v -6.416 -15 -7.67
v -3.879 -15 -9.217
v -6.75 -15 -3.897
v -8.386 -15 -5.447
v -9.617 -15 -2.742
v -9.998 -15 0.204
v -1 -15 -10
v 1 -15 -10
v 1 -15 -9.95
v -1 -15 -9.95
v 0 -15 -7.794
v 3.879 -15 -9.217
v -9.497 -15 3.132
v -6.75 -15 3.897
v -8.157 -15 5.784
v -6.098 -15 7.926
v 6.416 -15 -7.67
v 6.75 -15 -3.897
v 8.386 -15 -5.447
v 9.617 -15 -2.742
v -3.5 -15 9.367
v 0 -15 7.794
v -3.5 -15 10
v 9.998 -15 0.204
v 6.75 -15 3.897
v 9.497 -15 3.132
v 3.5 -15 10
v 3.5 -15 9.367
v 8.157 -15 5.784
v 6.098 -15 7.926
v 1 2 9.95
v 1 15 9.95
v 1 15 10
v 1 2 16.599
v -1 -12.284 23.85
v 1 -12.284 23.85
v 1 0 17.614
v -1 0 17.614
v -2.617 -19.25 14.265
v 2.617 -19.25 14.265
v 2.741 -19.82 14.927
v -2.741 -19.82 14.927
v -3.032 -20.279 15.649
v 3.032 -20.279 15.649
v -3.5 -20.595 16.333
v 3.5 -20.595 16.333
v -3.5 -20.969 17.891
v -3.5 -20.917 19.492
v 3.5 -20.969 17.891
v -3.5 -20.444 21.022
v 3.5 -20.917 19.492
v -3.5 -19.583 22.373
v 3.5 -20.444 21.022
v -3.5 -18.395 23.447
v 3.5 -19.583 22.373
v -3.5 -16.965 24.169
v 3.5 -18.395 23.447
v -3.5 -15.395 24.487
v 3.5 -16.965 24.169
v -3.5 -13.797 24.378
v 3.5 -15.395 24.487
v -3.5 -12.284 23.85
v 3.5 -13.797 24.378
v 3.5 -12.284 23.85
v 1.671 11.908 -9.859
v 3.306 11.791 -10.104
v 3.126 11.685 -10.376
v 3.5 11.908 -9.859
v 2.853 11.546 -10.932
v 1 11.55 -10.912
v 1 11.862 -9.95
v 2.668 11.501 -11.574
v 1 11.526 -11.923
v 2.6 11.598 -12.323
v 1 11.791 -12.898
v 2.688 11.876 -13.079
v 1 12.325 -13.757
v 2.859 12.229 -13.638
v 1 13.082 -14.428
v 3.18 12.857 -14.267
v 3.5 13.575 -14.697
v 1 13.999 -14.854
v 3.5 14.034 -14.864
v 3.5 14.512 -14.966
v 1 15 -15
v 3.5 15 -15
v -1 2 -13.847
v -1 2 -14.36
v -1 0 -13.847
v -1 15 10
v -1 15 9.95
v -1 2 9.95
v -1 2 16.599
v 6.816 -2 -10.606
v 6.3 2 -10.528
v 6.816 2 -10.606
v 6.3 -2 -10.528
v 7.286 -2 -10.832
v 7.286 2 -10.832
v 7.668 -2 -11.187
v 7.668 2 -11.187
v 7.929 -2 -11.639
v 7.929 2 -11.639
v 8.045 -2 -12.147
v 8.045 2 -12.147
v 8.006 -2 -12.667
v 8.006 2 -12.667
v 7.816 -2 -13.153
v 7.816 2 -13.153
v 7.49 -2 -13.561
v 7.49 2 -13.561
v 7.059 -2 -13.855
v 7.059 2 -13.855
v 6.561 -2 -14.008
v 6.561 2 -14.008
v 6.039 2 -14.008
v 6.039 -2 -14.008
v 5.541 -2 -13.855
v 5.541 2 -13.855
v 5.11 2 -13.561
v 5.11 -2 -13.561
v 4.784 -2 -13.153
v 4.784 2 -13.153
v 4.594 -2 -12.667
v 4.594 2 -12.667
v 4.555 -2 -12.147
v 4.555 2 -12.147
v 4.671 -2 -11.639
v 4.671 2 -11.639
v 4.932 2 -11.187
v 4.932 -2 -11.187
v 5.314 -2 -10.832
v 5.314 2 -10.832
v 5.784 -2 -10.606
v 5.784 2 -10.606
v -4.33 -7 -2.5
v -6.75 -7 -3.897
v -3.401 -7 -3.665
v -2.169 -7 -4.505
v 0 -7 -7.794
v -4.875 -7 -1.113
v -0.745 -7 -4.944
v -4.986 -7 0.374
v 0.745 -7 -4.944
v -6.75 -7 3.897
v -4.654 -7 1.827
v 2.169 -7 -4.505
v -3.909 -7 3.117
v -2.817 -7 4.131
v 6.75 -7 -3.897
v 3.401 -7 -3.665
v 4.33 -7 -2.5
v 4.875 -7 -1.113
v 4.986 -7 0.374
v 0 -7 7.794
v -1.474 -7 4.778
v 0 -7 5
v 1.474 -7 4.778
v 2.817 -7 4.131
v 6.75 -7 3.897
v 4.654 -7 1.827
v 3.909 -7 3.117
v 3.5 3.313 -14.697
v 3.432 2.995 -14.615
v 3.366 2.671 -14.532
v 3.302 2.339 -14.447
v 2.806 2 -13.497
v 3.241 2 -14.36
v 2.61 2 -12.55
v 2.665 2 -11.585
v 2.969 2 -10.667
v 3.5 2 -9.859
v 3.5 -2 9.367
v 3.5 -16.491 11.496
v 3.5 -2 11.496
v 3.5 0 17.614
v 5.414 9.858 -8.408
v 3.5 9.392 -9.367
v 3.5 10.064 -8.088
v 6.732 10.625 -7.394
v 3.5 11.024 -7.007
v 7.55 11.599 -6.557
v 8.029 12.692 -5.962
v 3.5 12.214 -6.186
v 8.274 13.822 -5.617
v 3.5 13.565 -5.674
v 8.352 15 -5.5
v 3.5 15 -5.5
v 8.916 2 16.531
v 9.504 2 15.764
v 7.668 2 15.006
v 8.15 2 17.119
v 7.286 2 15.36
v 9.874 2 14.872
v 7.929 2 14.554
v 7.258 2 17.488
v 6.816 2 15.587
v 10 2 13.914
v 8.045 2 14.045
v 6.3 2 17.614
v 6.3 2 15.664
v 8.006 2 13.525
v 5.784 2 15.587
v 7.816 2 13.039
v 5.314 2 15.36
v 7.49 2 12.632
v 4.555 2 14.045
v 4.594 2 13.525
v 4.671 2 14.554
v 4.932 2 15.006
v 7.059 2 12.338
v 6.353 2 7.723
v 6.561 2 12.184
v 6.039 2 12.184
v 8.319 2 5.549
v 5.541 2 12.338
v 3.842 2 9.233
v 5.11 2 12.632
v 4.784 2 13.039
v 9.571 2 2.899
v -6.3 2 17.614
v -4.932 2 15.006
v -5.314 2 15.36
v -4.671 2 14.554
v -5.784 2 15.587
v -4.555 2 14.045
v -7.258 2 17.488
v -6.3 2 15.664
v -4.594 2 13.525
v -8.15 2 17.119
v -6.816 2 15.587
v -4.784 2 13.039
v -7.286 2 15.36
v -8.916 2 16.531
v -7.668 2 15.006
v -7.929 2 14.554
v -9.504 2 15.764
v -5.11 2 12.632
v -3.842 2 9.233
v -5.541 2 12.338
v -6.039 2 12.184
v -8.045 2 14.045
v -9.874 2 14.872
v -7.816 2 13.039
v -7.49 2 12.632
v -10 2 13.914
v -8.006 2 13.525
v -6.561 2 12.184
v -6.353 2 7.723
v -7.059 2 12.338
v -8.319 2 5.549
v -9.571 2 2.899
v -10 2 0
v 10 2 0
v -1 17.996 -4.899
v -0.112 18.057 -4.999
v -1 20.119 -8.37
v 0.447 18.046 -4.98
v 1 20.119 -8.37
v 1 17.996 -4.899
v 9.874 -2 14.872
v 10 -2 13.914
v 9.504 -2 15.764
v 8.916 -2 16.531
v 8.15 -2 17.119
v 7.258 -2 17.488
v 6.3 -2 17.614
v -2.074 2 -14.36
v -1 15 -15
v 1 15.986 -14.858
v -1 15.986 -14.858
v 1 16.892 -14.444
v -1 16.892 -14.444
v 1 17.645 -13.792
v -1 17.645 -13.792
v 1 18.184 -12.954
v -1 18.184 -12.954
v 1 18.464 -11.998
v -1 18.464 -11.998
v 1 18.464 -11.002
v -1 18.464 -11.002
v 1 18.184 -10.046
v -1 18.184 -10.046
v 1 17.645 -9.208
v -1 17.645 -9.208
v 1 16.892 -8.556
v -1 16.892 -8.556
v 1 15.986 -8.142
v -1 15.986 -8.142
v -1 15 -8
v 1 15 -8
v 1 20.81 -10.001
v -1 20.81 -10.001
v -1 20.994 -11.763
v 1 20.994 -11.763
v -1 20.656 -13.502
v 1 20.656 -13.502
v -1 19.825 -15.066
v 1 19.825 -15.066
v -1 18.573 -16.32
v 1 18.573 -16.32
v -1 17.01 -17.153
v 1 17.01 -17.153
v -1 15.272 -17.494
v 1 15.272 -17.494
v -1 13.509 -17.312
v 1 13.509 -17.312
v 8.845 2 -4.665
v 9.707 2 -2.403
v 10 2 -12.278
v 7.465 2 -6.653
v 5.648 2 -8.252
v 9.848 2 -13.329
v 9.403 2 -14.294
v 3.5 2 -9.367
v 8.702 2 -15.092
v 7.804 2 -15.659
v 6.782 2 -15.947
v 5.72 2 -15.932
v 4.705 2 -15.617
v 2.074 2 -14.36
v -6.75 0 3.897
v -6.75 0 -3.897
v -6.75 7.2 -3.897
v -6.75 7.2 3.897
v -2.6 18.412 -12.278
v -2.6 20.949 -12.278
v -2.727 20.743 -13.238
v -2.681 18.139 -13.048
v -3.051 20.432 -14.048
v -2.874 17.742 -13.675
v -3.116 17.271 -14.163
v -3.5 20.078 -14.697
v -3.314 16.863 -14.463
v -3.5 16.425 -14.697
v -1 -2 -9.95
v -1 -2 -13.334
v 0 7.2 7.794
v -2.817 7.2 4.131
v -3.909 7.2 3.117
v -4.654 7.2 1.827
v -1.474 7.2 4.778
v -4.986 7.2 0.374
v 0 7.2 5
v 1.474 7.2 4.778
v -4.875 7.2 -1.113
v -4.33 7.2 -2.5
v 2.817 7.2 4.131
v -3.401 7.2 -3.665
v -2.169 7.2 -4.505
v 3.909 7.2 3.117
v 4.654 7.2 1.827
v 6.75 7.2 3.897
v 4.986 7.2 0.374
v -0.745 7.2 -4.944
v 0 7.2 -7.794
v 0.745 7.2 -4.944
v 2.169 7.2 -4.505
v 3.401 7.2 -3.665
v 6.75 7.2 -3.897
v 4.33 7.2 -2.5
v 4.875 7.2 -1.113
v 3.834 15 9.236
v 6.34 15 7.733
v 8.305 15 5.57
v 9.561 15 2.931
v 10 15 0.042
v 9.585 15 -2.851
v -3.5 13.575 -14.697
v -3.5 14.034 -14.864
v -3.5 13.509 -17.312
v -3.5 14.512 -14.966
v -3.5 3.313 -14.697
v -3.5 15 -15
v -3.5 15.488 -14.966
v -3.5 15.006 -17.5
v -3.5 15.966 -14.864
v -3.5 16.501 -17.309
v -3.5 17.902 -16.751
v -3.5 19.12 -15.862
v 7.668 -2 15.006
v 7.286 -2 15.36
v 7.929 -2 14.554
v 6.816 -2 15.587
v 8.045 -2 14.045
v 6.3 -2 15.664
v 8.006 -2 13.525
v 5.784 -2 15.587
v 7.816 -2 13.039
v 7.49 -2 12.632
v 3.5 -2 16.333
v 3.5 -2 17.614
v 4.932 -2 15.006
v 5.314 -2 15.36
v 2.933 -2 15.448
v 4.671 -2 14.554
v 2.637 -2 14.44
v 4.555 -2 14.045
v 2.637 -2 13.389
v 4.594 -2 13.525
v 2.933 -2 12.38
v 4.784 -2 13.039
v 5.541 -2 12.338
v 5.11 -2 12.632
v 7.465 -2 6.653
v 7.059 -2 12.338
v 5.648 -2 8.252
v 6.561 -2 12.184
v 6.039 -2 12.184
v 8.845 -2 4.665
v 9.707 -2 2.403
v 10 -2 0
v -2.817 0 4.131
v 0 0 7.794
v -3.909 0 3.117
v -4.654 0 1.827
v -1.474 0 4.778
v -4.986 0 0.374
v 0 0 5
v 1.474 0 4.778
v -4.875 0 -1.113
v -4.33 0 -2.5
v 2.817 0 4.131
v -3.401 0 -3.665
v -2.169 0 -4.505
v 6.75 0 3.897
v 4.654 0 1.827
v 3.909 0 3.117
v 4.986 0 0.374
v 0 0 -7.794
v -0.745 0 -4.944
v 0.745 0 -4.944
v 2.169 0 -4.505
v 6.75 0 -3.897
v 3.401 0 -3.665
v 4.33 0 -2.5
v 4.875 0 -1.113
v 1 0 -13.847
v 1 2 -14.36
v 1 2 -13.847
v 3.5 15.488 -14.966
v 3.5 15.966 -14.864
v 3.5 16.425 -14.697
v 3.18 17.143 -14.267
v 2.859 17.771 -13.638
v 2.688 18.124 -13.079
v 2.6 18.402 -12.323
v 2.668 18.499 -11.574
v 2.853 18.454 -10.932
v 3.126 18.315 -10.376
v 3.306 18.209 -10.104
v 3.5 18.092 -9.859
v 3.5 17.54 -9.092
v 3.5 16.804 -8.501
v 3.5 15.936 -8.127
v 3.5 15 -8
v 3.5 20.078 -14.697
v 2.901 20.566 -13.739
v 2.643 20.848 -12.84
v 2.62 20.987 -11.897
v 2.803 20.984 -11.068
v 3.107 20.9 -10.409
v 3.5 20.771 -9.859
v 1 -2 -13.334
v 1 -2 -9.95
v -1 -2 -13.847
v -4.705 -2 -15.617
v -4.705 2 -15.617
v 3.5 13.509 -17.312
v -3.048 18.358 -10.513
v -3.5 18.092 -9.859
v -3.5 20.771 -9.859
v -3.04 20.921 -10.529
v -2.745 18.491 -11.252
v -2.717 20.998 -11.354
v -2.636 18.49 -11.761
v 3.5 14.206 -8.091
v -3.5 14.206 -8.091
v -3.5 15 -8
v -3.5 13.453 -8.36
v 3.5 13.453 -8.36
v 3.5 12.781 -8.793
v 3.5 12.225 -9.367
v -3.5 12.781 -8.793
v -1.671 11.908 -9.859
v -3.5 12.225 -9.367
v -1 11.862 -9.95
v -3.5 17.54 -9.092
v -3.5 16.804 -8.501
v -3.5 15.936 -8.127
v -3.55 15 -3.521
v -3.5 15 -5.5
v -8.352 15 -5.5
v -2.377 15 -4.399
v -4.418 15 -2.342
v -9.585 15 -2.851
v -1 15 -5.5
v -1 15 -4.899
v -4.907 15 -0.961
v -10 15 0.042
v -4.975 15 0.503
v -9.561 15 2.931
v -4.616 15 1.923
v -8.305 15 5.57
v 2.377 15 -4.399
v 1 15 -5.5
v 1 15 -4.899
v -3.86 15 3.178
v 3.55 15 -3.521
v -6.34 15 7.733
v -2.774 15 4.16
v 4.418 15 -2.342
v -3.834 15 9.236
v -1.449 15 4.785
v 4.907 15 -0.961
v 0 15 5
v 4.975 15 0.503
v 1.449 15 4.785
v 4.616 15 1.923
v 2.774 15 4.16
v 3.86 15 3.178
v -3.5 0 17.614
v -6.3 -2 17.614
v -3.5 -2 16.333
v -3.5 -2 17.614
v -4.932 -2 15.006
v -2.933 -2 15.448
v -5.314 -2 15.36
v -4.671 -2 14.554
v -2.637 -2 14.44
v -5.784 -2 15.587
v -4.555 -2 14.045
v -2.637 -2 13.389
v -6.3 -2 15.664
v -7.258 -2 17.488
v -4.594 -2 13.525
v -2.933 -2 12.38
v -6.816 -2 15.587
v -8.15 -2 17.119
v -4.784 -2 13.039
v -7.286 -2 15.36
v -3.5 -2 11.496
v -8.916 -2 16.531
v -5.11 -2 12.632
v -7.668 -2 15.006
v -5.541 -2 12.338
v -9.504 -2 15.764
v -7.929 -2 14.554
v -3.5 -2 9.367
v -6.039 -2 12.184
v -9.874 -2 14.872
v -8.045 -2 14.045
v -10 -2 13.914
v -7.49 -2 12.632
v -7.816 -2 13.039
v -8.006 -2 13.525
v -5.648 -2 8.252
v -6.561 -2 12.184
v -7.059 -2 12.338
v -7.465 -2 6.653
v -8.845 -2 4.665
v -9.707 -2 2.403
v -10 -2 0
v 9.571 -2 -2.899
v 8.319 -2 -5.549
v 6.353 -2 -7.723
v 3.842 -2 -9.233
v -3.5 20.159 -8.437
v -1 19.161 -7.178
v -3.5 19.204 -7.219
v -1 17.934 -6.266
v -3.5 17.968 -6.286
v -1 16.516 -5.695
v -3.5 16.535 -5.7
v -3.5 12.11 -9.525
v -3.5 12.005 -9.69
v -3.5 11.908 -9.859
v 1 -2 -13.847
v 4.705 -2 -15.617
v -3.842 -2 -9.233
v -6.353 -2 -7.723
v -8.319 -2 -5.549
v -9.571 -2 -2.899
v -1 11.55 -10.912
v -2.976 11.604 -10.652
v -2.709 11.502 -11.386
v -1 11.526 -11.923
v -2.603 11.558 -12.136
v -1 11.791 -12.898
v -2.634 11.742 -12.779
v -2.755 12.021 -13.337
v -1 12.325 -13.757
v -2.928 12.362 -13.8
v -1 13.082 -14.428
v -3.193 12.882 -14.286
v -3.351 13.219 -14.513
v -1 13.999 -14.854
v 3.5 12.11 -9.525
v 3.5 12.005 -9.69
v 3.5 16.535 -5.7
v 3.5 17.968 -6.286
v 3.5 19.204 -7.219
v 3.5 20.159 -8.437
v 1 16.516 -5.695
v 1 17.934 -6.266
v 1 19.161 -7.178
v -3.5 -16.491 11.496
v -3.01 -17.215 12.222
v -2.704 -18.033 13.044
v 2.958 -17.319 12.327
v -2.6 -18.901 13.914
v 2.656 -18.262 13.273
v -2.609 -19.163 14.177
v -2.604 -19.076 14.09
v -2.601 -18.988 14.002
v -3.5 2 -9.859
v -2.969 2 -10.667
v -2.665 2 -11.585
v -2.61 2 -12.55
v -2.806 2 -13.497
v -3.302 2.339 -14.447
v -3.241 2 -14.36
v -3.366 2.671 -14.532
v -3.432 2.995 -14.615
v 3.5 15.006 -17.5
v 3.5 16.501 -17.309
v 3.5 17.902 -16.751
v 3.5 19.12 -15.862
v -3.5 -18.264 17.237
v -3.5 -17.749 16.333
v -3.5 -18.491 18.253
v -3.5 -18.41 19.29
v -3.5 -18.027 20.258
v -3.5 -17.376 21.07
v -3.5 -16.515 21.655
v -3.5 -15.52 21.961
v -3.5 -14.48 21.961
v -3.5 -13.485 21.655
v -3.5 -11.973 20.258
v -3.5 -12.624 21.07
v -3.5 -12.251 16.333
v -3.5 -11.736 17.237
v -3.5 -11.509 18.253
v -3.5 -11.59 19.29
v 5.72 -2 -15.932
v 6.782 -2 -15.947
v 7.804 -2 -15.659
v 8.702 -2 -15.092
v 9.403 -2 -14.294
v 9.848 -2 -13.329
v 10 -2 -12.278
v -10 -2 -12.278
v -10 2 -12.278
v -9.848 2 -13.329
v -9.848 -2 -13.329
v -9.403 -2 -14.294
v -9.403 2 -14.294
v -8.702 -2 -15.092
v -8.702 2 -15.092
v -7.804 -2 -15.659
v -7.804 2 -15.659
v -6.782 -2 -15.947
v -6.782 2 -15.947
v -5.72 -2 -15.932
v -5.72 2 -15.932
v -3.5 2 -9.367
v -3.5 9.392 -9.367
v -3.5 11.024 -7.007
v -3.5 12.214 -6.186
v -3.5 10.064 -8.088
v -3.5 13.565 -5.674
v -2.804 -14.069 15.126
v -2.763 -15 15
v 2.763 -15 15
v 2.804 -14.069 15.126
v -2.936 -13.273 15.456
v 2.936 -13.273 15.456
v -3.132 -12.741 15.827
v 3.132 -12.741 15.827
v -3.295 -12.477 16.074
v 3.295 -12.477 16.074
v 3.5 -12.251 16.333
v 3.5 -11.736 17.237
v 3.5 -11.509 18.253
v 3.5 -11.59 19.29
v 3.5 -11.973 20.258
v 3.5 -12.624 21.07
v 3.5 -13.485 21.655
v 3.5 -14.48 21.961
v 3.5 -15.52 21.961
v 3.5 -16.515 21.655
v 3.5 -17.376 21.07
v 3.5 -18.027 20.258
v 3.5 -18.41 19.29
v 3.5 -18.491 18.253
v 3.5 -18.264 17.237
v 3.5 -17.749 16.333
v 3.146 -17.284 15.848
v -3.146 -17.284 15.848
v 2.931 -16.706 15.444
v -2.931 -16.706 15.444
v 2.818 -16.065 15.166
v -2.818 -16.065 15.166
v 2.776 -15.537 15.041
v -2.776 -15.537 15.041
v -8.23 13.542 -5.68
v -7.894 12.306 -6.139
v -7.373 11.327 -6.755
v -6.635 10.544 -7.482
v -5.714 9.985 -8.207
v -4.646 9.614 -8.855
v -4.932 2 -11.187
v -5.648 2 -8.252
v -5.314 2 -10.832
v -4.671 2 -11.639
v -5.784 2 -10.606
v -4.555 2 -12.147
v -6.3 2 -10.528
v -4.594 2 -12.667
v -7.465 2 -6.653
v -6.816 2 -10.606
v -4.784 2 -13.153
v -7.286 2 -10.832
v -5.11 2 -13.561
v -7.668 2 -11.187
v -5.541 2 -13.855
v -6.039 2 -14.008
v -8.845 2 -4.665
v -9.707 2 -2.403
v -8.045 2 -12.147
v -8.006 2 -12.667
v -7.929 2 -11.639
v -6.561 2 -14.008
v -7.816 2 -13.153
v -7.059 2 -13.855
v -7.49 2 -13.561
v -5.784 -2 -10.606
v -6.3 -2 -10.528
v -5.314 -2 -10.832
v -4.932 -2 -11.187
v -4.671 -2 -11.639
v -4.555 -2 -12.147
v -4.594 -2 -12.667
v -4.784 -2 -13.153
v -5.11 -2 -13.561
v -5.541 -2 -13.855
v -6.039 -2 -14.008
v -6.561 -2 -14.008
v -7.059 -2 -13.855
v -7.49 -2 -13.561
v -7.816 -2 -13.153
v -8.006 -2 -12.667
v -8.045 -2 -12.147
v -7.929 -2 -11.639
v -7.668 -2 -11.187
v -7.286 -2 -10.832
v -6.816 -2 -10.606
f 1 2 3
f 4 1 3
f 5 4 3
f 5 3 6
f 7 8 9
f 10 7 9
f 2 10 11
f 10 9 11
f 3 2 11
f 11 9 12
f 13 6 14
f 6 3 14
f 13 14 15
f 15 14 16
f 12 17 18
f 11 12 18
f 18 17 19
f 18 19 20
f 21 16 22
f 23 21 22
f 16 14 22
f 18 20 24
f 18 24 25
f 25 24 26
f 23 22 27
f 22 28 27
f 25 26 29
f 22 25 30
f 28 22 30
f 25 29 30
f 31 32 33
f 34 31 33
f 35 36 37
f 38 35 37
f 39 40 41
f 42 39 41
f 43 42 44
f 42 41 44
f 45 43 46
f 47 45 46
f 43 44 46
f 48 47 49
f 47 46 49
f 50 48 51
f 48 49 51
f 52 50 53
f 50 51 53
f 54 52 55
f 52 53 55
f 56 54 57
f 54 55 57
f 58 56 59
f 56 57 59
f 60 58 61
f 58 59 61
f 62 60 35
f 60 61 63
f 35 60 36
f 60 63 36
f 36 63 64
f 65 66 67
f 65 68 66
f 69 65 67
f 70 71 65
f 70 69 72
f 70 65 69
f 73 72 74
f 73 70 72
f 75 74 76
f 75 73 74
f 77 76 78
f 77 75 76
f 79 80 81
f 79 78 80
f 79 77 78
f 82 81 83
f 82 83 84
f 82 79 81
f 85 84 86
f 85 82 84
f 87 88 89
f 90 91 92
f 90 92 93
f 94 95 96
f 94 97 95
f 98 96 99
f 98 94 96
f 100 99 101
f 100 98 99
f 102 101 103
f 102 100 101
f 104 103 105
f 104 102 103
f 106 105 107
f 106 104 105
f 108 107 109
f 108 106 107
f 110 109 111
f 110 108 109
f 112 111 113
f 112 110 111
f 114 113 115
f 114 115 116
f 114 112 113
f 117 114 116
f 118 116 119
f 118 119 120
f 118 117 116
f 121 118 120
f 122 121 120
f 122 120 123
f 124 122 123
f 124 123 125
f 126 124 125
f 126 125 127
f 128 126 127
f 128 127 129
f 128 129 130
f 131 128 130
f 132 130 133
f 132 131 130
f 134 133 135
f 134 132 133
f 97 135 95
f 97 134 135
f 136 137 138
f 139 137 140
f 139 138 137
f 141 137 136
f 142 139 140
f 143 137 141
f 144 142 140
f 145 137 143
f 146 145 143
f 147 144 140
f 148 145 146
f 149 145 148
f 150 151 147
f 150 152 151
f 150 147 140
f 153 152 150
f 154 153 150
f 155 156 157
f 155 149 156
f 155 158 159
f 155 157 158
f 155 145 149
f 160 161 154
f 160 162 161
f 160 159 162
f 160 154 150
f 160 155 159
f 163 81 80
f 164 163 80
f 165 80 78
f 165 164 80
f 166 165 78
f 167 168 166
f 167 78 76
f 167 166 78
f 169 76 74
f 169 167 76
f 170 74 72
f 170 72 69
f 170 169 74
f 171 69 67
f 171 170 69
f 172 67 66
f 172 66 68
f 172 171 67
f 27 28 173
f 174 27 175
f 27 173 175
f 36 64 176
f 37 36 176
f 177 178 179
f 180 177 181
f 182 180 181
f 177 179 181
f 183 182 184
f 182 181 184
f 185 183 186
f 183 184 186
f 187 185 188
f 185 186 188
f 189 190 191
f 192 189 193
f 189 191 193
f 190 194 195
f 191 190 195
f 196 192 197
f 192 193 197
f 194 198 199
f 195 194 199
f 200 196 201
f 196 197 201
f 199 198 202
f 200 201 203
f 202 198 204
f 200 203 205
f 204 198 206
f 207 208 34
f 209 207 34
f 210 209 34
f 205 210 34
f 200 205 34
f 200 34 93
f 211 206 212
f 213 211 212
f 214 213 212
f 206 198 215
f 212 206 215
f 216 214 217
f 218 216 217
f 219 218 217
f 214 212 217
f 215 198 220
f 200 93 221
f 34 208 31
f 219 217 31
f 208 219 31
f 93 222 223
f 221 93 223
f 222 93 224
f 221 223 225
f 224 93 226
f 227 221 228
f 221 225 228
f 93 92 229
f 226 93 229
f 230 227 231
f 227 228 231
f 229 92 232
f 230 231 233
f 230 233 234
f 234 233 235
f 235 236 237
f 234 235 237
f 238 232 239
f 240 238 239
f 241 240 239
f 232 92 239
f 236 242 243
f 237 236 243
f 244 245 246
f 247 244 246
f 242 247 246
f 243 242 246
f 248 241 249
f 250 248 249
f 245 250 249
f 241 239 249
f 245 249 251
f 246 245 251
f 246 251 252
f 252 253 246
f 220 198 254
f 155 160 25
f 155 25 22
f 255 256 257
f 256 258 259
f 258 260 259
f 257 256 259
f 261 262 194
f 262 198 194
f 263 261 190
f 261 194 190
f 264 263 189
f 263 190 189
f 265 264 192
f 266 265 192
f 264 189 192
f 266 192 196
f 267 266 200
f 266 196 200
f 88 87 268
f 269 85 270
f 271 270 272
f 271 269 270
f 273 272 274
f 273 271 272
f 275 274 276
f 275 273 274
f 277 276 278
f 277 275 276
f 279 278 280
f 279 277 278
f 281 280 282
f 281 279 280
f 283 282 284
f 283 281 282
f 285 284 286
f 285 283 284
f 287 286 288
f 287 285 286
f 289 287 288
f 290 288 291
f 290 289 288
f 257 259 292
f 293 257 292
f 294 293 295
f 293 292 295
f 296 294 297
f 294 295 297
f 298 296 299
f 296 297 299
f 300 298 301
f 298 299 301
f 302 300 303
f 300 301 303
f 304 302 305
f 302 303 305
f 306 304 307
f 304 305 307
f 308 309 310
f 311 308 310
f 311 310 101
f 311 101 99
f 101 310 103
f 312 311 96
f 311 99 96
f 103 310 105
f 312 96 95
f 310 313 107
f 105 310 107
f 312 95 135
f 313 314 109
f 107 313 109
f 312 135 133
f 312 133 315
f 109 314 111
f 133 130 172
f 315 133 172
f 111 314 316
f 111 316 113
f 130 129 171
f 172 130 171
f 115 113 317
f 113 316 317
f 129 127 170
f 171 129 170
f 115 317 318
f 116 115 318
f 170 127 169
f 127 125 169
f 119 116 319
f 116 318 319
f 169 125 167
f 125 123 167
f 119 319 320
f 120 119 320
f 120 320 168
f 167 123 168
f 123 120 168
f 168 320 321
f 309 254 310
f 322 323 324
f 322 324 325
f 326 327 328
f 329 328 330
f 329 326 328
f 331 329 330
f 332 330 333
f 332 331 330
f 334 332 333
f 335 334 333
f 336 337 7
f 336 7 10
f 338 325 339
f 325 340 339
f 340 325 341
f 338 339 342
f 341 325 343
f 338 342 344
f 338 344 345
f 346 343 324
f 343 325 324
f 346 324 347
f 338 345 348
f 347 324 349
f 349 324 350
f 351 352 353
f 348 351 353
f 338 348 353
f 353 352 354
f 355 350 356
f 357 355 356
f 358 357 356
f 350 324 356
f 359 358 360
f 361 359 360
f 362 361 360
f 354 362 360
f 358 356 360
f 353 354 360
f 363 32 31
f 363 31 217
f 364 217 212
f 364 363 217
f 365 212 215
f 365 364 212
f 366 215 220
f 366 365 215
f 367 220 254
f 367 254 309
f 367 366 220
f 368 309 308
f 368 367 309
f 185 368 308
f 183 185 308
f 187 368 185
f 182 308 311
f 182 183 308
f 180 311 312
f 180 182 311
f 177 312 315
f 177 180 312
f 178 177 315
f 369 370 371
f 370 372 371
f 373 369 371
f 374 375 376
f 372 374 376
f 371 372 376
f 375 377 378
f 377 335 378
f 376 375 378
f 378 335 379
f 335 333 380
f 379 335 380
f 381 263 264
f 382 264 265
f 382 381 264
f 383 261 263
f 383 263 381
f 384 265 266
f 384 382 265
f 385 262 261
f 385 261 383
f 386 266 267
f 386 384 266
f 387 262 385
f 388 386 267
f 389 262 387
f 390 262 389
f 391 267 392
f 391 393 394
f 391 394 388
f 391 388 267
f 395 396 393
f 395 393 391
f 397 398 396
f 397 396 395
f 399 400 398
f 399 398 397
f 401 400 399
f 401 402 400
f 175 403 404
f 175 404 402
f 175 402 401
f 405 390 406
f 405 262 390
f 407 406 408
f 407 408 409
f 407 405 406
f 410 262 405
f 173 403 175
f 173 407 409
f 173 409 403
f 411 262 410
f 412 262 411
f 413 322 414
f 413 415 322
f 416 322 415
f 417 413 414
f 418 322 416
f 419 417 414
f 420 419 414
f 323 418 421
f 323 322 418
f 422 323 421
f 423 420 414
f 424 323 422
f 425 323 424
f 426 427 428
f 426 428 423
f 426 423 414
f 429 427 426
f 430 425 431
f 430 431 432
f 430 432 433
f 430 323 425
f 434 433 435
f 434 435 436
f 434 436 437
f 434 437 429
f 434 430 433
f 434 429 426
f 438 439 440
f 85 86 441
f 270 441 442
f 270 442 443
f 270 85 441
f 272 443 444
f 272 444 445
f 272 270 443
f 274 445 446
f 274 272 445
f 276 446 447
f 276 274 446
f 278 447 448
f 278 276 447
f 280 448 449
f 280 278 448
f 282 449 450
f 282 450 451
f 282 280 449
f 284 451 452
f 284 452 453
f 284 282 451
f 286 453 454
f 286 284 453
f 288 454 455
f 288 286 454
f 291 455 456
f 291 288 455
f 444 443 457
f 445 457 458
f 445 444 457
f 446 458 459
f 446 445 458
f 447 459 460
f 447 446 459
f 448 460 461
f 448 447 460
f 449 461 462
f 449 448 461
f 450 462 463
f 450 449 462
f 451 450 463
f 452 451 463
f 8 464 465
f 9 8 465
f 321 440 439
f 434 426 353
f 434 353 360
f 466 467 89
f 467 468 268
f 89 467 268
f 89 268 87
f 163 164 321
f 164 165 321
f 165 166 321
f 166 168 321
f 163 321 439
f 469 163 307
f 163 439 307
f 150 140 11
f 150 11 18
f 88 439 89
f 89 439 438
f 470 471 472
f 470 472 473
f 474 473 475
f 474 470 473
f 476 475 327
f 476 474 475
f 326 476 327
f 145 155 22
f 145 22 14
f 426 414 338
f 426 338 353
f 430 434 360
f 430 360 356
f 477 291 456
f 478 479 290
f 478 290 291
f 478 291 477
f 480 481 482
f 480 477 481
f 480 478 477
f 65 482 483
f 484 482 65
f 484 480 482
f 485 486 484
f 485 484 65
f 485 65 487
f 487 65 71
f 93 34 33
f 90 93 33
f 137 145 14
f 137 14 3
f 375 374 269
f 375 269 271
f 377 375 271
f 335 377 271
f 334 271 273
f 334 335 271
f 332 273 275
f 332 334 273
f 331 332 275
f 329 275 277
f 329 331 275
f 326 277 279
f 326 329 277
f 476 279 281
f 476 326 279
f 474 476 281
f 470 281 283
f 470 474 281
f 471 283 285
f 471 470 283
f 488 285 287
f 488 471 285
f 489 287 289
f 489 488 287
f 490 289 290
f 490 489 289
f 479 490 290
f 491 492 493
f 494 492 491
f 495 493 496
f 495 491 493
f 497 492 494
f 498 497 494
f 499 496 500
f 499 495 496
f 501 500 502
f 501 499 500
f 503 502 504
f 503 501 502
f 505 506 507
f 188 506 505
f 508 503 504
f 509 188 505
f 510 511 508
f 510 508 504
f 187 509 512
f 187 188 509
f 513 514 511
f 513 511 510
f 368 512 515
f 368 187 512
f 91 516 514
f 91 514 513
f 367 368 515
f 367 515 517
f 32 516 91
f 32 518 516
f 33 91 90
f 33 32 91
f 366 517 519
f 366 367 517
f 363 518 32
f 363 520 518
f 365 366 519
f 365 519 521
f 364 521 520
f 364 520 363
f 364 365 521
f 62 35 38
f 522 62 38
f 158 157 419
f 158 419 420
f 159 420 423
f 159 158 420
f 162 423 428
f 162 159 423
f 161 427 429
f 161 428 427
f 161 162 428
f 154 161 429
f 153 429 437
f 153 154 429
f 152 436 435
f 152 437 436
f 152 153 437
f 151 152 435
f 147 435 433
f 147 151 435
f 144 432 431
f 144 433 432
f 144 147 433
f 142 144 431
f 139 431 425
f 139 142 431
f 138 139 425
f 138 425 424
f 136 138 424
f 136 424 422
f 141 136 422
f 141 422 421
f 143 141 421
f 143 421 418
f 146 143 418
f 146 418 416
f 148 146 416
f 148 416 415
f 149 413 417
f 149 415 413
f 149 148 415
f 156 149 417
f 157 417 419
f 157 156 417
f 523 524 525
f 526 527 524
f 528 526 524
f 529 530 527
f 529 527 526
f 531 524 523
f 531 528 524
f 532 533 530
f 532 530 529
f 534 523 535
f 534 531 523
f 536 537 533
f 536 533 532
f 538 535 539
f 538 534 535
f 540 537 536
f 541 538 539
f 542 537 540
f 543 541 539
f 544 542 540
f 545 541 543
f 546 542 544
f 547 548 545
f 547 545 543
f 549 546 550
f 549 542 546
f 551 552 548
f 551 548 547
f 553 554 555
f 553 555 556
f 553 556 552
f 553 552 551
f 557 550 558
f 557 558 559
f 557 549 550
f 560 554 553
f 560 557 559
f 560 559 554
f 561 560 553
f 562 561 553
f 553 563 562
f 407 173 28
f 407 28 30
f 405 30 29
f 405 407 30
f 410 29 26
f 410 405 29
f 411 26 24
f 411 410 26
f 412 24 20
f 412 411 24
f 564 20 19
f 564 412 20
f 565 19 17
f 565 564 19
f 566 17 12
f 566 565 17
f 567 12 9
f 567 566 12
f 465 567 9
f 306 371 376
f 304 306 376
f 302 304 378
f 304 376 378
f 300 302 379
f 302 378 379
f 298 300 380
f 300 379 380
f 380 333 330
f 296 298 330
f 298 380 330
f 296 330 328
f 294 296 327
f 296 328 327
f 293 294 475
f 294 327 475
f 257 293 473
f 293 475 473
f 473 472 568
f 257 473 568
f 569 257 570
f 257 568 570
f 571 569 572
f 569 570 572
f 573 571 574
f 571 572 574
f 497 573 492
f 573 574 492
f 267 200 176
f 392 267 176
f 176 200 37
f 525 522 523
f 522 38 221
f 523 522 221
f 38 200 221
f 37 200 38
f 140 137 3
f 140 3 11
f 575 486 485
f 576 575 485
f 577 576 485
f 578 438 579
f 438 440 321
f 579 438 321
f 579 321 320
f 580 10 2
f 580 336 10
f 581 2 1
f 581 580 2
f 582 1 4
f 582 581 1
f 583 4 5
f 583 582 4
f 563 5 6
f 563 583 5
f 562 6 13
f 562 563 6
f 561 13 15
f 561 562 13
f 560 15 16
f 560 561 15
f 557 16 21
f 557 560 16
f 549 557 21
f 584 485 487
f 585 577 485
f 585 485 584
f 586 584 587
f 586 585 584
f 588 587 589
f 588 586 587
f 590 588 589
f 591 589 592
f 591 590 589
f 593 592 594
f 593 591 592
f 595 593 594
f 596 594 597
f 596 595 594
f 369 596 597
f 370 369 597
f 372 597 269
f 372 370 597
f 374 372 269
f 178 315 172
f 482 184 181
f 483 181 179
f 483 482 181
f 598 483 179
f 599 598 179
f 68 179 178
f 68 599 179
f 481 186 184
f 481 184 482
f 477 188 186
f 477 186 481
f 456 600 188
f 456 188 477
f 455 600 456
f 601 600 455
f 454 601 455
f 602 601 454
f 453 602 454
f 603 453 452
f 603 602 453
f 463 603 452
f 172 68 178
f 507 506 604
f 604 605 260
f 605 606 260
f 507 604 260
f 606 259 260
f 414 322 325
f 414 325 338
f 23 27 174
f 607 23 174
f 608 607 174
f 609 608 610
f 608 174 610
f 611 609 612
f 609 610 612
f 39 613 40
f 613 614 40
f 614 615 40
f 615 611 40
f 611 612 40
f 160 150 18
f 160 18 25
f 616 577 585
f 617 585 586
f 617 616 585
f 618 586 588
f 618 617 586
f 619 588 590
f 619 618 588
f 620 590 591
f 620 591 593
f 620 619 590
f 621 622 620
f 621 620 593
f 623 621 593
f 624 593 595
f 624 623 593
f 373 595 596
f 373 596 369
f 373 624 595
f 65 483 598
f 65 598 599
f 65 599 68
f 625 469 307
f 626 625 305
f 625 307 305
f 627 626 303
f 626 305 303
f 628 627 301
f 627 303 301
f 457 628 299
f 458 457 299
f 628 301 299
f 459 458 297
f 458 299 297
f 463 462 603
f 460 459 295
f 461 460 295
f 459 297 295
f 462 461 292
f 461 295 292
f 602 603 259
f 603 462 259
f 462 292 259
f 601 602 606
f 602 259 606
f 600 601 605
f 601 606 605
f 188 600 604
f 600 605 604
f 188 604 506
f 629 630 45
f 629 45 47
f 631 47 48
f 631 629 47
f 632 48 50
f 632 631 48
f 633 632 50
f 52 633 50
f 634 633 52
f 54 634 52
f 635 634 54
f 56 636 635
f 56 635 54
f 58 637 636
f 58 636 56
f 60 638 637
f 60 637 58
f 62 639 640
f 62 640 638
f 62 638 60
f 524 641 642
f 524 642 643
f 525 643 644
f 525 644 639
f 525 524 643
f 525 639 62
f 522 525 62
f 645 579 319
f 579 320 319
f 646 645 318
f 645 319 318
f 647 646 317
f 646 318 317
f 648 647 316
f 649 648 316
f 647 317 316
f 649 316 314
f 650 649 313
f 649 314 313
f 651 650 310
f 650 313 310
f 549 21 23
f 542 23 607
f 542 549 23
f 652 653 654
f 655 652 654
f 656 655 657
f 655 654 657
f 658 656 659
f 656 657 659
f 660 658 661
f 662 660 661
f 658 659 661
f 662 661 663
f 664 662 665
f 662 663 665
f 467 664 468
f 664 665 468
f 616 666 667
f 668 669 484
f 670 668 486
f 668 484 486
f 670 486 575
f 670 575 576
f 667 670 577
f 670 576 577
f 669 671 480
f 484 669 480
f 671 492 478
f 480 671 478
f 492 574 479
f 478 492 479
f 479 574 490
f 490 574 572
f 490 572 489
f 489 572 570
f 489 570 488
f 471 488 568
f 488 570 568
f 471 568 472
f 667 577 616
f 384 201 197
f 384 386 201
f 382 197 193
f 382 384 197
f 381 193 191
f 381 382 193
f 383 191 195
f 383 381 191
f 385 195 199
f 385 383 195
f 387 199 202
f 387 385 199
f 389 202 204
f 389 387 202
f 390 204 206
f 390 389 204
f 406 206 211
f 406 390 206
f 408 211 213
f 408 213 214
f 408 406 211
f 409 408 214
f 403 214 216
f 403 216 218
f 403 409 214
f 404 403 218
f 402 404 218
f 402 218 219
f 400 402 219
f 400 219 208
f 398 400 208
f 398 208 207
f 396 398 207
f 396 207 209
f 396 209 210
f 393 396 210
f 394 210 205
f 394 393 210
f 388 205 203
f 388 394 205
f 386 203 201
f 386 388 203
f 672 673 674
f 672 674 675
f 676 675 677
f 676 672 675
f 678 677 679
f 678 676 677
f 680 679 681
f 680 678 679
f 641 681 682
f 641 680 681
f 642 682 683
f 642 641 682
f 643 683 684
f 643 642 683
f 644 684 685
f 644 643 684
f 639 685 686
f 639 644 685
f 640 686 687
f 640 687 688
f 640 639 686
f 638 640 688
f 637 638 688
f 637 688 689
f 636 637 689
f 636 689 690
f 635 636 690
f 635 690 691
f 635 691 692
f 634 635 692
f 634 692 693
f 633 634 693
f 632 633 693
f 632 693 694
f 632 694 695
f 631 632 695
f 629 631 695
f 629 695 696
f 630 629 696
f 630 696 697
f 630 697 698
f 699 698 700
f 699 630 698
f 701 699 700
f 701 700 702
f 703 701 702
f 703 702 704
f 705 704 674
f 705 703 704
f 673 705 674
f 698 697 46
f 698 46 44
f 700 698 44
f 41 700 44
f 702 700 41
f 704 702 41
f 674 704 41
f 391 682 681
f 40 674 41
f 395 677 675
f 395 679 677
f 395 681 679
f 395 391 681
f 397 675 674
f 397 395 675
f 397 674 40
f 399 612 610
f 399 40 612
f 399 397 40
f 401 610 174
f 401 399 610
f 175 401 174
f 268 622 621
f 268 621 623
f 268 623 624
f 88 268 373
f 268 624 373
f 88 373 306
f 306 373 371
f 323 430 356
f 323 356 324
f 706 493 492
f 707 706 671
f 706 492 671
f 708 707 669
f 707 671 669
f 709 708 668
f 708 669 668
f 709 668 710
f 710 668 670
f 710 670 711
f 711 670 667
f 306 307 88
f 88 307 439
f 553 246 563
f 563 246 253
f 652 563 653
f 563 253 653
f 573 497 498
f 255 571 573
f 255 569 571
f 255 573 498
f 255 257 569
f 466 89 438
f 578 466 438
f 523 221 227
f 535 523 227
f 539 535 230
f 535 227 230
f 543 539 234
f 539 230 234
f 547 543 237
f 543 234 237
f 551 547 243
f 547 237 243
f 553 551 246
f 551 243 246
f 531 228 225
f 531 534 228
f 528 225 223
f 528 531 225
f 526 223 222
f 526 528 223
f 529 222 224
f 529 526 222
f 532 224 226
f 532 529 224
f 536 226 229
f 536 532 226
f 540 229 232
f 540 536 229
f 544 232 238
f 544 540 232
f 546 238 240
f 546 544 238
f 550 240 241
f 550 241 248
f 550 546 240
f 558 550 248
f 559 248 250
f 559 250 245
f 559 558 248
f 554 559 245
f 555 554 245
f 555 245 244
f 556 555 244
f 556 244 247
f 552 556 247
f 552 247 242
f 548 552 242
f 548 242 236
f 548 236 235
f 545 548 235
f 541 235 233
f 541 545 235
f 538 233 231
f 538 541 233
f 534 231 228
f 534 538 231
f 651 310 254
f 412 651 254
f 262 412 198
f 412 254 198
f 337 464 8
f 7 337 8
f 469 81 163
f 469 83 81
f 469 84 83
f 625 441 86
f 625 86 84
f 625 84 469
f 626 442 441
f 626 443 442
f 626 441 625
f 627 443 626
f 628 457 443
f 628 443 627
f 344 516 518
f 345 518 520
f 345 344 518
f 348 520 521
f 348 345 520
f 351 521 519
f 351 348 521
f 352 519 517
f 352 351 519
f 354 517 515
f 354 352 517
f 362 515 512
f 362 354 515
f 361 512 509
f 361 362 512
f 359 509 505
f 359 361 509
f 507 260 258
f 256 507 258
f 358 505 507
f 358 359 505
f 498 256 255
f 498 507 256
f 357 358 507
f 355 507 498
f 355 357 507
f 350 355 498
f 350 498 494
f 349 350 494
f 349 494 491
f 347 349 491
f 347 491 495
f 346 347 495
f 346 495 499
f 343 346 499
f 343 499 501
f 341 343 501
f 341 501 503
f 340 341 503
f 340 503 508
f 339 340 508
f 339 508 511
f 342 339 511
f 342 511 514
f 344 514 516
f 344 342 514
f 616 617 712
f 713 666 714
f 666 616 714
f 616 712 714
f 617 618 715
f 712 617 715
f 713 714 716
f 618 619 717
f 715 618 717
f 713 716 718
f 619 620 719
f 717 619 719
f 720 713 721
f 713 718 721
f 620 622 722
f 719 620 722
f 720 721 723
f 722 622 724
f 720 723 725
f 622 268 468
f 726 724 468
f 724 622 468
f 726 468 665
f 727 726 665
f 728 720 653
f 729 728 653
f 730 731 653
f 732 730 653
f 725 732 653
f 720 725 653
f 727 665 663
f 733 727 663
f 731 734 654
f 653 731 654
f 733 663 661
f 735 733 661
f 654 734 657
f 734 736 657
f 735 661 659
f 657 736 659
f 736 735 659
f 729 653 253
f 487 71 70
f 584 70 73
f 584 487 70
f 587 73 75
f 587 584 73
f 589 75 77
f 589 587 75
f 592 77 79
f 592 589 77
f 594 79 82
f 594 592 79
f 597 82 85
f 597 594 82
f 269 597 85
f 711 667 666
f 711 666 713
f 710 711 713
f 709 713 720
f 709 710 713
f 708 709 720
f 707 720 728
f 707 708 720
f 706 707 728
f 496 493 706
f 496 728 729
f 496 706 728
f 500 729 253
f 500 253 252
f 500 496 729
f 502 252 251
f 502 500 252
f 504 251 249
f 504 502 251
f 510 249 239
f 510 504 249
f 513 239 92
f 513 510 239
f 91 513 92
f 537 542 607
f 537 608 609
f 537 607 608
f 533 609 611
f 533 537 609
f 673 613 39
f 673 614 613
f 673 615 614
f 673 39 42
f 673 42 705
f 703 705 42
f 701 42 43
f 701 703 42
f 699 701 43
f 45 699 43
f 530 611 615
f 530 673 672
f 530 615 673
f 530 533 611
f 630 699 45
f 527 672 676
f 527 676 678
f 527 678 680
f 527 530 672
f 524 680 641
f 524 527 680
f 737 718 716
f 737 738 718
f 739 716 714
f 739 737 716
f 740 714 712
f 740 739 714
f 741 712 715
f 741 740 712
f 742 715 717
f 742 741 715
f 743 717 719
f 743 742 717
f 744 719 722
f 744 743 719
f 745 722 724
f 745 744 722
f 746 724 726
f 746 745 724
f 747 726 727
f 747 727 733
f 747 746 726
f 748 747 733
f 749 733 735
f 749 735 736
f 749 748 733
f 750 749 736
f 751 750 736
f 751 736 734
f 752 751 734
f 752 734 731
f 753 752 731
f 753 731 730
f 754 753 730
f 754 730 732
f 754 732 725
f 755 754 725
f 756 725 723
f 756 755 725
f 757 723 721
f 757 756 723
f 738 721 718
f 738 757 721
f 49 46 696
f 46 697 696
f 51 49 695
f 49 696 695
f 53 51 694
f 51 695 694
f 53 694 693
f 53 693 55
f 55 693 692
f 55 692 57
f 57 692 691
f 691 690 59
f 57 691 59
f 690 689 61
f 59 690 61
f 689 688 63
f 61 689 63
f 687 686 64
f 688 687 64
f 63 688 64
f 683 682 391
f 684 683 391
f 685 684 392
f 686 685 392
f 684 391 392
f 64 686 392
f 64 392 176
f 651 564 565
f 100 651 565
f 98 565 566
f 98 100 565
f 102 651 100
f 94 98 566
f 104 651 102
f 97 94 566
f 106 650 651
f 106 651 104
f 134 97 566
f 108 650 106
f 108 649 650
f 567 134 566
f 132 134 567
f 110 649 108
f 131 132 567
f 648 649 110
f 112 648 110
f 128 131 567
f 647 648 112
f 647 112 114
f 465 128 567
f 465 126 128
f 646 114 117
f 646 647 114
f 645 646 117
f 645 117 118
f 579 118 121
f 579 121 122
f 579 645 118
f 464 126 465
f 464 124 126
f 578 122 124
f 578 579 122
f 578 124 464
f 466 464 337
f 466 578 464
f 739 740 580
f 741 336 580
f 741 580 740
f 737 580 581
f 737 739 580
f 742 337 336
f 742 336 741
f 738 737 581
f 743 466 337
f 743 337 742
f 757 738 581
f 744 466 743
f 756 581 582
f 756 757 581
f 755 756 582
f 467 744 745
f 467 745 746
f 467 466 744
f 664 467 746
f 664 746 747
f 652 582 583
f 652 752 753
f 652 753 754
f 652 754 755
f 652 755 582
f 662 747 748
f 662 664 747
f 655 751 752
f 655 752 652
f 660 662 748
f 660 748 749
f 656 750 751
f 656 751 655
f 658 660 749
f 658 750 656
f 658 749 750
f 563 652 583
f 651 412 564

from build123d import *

# Parameters (mm, degrees)
SKETCH2_R                = 10
BOSS_EXTRUDE1_DEPTH      = 15
SKETCH3_R                = 3.5
BOSS_EXTRUDE2_DEPTH      = 1
SKETCH6_R                = 1.75
BOSS_EXTRUDE3_DEPTH      = 2
SKETCH9_R                = 3.5
BOSS_EXTRUDE4_DEPTH      = 3.5
CUT_EXTRUDE12_DEPTH      = 7.2
CUT_EXTRUDE3_DEPTH       = 45.679413626
CUT_EXTRUDE3_DEPTH_BACK  = 8
SKETCH14_R               = 6
CUT_EXTRUDE7_DEPTH       = 35.978564903
SKETCH15_R               = 6
CUT_EXTRUDE8_DEPTH       = 33.94692706
CUT_EXTRUDE2_DEPTH       = 45.679413626
CUT_EXTRUDE2_DEPTH_BACK  = 45.679413626
SKETCH8_R                = 5
SKETCH16_R               = 3.7
CUT_EXTRUDE9_DEPTH       = 36.060661745
SKETCH17_R               = 3.7
CUT_EXTRUDE10_DEPTH      = 36.060661811
CUT_EXTRUDE13_DEPTH      = 34.782392028
CUT_EXTRUDE13_DEPTH_BACK = 34.782392028
SKETCH21_R               = 3.5


with BuildPart() as part:
    # Sketch2 → Boss-Extrude1 (new, symmetric)
    with BuildSketch(Plane(origin=(0, 0, 0), x_dir=(1, 0, 0), z_dir=(0, 1, 0))):
        Circle(SKETCH2_R)
    extrude(amount=BOSS_EXTRUDE1_DEPTH, both=True)

    # Sketch3 → Boss-Extrude2 (add, symmetric)
    with BuildSketch(Plane(origin=(0, 0, 0), x_dir=(0, 0, -1), z_dir=(1, 0, 0))):
        with BuildLine():
            Line((10, -15), (-10, -15))
            Line((-10, -15), (-14.264705882, -19.249974557))
            ThreePointArc((-14.264705882, -19.249974557), (-22.027248631, -19.853711682), (-23.850142927, -12.284126171))
            Line((-23.850142927, -12.284126171), (-10, 15))
            Line((-10, 15), (0, 15))
            Line((0, 15), (8.369565217, 20.118630488))
            ThreePointArc((8.369565217, 20.118630488), (15.066233626, 19.825140177), (17.311895323, 13.509405234))
            Line((17.311895323, 13.509405234), (10, -15))
        make_face()
        with Locations((11.5, 15)):
            Circle(SKETCH3_R, mode=Mode.SUBTRACT)
        with Locations((-18.5, -15)):
            Circle(SKETCH3_R, mode=Mode.SUBTRACT)
    extrude(amount=BOSS_EXTRUDE2_DEPTH, both=True)

    # Sketch6 → Boss-Extrude3 (add, symmetric)
    with BuildSketch(Plane(origin=(0, 0, 0), x_dir=(1, 0, 0), z_dir=(0, 1, 0))):
        with BuildLine():
            Line((-4.705422643, 15.616789864), (-1, 13.847096386))
            Line((-1, 13.847096386), (1, 13.847096386))
            Line((1, 13.847096386), (4.705422643, 15.616789864))
            ThreePointArc((4.705422643, 15.616789864), (8.273583515, 15.407720534), (10, 12.278029158))
            Line((10, 12.278029158), (10, -13.9143961))
            ThreePointArc((10, -13.9143961), (8.91629509, -16.530691191), (6.3, -17.6143961))
            Line((6.3, -17.6143961), (-6.3, -17.6143961))
            ThreePointArc((-6.3, -17.6143961), (-8.91629509, -16.530691191), (-10, -13.9143961))
            Line((-10, -13.9143961), (-10, 12.278029158))
            ThreePointArc((-10, 12.278029158), (-8.273583515, 15.407720534), (-4.705422643, 15.616789864))
        make_face()
        with Locations((-6.3, 12.278029158)):
            Circle(SKETCH6_R, mode=Mode.SUBTRACT)
        with Locations((6.3, 12.278029158)):
            Circle(SKETCH6_R, mode=Mode.SUBTRACT)
        with Locations((6.3, -13.9143961)):
            Circle(SKETCH6_R, mode=Mode.SUBTRACT)
        with Locations((-6.3, -13.9143961)):
            Circle(SKETCH6_R, mode=Mode.SUBTRACT)
    extrude(amount=BOSS_EXTRUDE3_DEPTH, both=True)

    # Sketch9 → Boss-Extrude4 (add, symmetric)
    # profile 1 of 2: a face of its own
    with BuildSketch(Plane(origin=(0, 0, 0), x_dir=(0, 0, -1), z_dir=(1, 0, 0))):
        with BuildLine():
            Line((14.360042571, 2), (17.311895323, 13.509405234))
            ThreePointArc((17.311895323, 13.509405234), (12.251208381, 20.952788084), (5.5, 15))
            Line((5.5, 15), (5.5, 2))
            Line((5.5, 2), (14.360042571, 2))
        make_face()
        with Locations((11.5, 15)):
            Circle(SKETCH9_R, mode=Mode.SUBTRACT)
    # profile 2 of 2: a face of its own
    with BuildSketch(Plane(origin=(0, 0, 0), x_dir=(0, 0, -1), z_dir=(1, 0, 0))):
        with BuildLine():
            Line((-23.850142927, -12.284126171), (-17.6143961, 0))
            Line((-17.6143961, 0), (-7.949874371, 0))
            Line((-7.949874371, 0), (-7.949874371, -15))
            Line((-7.949874371, -15), (-10, -15))
            Line((-10, -15), (-14.264705882, -19.249974557))
            ThreePointArc((-14.264705882, -19.249974557), (-22.027248631, -19.853711682), (-23.850142927, -12.284126171))
        make_face()
        with Locations((-18.5, -15)):
            Circle(SKETCH9_R, mode=Mode.SUBTRACT)
    extrude(amount=BOSS_EXTRUDE4_DEPTH, both=True)

    # Sketch20 → Cut-Extrude12 (cut)
    with BuildSketch(Plane(origin=(0, 0, 0), x_dir=(1, 0, 0), z_dir=(0, 1, 0))):
        Polygon((0, -7.794228634), (6.75, -3.897114317), (6.75, 3.897114317), (0, 7.794228634), (-6.75, 3.897114317), (-6.75, -3.897114317), align=None)
    extrude(amount=CUT_EXTRUDE12_DEPTH, mode=Mode.SUBTRACT)

    # Sketch10 → Cut-Extrude3 (cut, two sides: drawn at the far end of the back side and taken through both)
    with BuildSketch(Plane.XZ.offset(15).offset(-CUT_EXTRUDE3_DEPTH_BACK)):
        Polygon((0, -7.794228634), (6.75, -3.897114317), (6.75, 3.897114317), (0, 7.794228634), (-6.75, 3.897114317), (-6.75, -3.897114317), align=None)
    extrude(amount=CUT_EXTRUDE3_DEPTH + CUT_EXTRUDE3_DEPTH_BACK, mode=Mode.SUBTRACT)

    # Sketch14 → Cut-Extrude7 (cut, through all)
    with BuildSketch(Plane(origin=(-3.5, 0, 0), x_dir=(0, 0, -1), z_dir=(1, 0, 0))):
        with Locations((11.5, 15)):
            Circle(SKETCH14_R)
        with Locations((-18.5, -15)):
            Circle(SKETCH14_R)
    extrude(amount=-CUT_EXTRUDE7_DEPTH, mode=Mode.SUBTRACT)

    # Sketch15 → Cut-Extrude8 (cut, through all)
    with BuildSketch(Plane(origin=(3.5, 0, 3), x_dir=(0, 0, 1), z_dir=(-1, 0, 0))):
        with Locations((15.5, -15)):
            Circle(SKETCH15_R)
        with Locations((-14.5, 15)):
            Circle(SKETCH15_R)
    extrude(amount=-CUT_EXTRUDE8_DEPTH, mode=Mode.SUBTRACT)

    # Sketch8 → Cut-Extrude2 (cut, two sides: drawn at the far end of the back side and taken through both)
    with BuildSketch(Plane(origin=(0, 15, 0), x_dir=(1, 0, 0), z_dir=(0, 1, 0)).offset(-CUT_EXTRUDE2_DEPTH_BACK)):
        Circle(SKETCH8_R)
    extrude(amount=CUT_EXTRUDE2_DEPTH + CUT_EXTRUDE2_DEPTH_BACK, mode=Mode.SUBTRACT)

    # Sketch16 → Cut-Extrude9 (cut, through all)
    with BuildSketch(Plane(origin=(0, 2, 0), x_dir=(1, 0, 0), z_dir=(0, 1, 0))):
        with Locations((6.3, 12.278029158)):
            Circle(SKETCH16_R)
        with Locations((-6.3, 12.278029158)):
            Circle(SKETCH16_R)
    extrude(amount=CUT_EXTRUDE9_DEPTH, mode=Mode.SUBTRACT)

    # Sketch17 → Cut-Extrude10 (cut, through all)
    with BuildSketch(Plane.XZ.offset(2)):
        with Locations((6.3, 13.9143961)):
            Circle(SKETCH17_R)
        with Locations((-6.3, 13.9143961)):
            Circle(SKETCH17_R)
        with Locations((6.3, -12.278029158)):
            Circle(SKETCH17_R)
        with Locations((-6.3, -12.278029158)):
            Circle(SKETCH17_R)
    extrude(amount=CUT_EXTRUDE10_DEPTH, mode=Mode.SUBTRACT)

    # Sketch21 → Cut-Extrude13 (cut, two sides: drawn at the far end of the back side and taken through both)
    with BuildSketch(Plane(origin=(0, 0, 0), x_dir=(0, 0, -1), z_dir=(1, 0, 0)).offset(-CUT_EXTRUDE13_DEPTH_BACK)):
        with Locations((11.5, 15)):
            Circle(SKETCH21_R)
    extrude(amount=CUT_EXTRUDE13_DEPTH + CUT_EXTRUDE13_DEPTH_BACK, mode=Mode.SUBTRACT)


solid = part.part
